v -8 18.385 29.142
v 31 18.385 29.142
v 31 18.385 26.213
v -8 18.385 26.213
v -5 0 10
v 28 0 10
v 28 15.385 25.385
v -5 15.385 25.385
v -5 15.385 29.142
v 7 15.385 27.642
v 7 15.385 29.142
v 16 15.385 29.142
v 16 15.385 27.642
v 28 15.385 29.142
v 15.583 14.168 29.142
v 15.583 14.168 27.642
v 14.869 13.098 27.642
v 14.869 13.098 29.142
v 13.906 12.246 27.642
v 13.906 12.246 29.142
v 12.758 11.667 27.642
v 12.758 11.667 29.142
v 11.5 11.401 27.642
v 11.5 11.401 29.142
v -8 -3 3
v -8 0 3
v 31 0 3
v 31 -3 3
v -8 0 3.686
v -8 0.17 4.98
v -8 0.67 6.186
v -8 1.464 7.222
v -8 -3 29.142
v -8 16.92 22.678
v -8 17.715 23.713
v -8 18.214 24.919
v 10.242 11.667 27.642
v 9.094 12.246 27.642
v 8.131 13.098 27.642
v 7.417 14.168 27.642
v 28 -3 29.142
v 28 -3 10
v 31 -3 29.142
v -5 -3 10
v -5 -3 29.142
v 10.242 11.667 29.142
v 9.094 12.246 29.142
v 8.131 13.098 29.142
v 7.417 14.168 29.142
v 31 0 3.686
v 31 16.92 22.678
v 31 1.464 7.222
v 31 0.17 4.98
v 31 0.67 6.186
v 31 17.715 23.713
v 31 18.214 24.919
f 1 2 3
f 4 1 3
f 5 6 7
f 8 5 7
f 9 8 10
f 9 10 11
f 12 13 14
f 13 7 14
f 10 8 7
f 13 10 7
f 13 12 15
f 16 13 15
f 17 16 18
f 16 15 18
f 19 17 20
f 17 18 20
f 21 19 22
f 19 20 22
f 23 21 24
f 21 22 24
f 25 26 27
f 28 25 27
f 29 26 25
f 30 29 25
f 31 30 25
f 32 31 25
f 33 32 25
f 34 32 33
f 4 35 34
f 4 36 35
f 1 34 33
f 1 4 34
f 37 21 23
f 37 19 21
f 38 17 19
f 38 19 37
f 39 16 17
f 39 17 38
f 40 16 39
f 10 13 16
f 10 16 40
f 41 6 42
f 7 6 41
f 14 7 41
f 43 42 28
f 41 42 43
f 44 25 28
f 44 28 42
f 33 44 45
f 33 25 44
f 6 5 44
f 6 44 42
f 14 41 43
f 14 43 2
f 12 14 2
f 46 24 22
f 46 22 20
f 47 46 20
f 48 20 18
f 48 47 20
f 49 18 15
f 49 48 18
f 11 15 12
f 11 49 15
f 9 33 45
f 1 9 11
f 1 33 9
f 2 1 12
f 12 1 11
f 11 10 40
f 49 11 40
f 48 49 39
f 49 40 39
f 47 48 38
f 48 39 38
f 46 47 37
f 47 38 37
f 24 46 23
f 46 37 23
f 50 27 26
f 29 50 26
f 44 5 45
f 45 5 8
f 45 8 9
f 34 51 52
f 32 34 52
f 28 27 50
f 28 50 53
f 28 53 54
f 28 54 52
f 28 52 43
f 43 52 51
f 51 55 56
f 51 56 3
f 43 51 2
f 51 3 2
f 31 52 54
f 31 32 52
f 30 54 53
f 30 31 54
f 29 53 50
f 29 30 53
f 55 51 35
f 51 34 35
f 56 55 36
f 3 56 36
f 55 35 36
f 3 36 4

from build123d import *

# Parameters (mm, degrees)
SKETCH_1_W          = 25
SKETCH_1_H          = 10
EXTRUDE_1_DEPTH     = 3
EXTRUDE_3_DEPTH     = 7
EXTRUDE_4_DEPTH     = 39
EXTRUDE_6_DEPTH     = 3
EXTRUDE_7_DEPTH     = 3
SKETCH_10_W         = 25
SKETCH_10_H         = 10
CUT_EXTRUDE_1_DEPTH = 3
FILLET_1_R          = 5
FILLET_2_R          = 5
SKETCH_12_W         = 9
SKETCH_12_H         = 1.5
EXTRUDE_9_DEPTH     = 4
FILLET_3_R          = 5


with BuildPart() as part:
    # 草图1 → 凸台-拉伸1 (new body)
    with BuildSketch(Plane.XY):
        with Locations((12.5, -5)):
            Rectangle(SKETCH_1_W, SKETCH_1_H)
    extrude(amount=EXTRUDE_1_DEPTH)

    # 草图5 → 凸台-拉伸3 (add)
    with BuildSketch(Plane.XY.offset(3)):
        Polygon((25, 0), (-2, 0), (-8, 0), (-8, -3), (0, -3), (27.572478777, -3), (31, -3), (31, 0), align=None)
    extrude(amount=EXTRUDE_3_DEPTH)

    # 草图6 → 凸台-拉伸4 (add)
    with BuildSketch(Plane(origin=(31, 0, 0), x_dir=(0, 0, -1), z_dir=(1, 0, 0))):
        Polygon((-10, 0), (-25.384776311, 15.384776311), (-29.142135624, 15.384776311), (-29.142135624, 18.384776311), (-24.142135624, 18.384776311), (-5.757359313, 0), align=None)
    extrude(amount=-EXTRUDE_4_DEPTH)

    # 草图8 → 凸台-拉伸6 (add)
    with BuildSketch(Plane(origin=(31, 0, 0), x_dir=(0, 0, -1), z_dir=(1, 0, 0))):
        Polygon((-29.142135624, 15.384776311), (-25.384776311, 15.384776311), (-10, 0), (-10, -3), (-29.142135624, -3), align=None)
    extrude(amount=-EXTRUDE_6_DEPTH)

    # 草图9 → 凸台-拉伸7 (add)
    with BuildSketch(Plane.ZY.offset(8)):
        Polygon((29.142135624, 15.384776311), (25.384776311, 15.384776311), (10, 0), (10, -3), (29.142135624, -3), align=None)
    extrude(amount=-EXTRUDE_7_DEPTH)

    # 草图10 → 切除-拉伸1 (cut)
    with BuildSketch(Plane(origin=(0, 0, 0), x_dir=(-1, 0, 0), z_dir=(0, 0, -1))):
        with Locations((-12.5, -5)):
            Rectangle(SKETCH_10_W, SKETCH_10_H)
    extrude(amount=-CUT_EXTRUDE_1_DEPTH, mode=Mode.SUBTRACT)

    # 圆角1
    fillet_1_edges = [part.edges().sort_by_distance(p)[0] for p in [
        (11.5, 18.384776311, 24.142135624),
    ]]
    fillet(fillet_1_edges, radius=FILLET_1_R)

    # 圆角2
    fillet_2_edges = [part.edges().sort_by_distance(p)[0] for p in [
        (11.5, 0, 5.757359313),
    ]]
    fillet(fillet_2_edges, radius=FILLET_2_R)

    # 草图12 → 凸台-拉伸9 (add)
    with BuildSketch(Plane(origin=(0, 15.384776311, 0), x_dir=(-1, 0, 0), z_dir=(0, -1, 0))):
        with Locations((-11.5, -28.392135624)):
            Rectangle(SKETCH_12_W, SKETCH_12_H)
    extrude(amount=EXTRUDE_9_DEPTH)

    # 圆角3
    # the kernel refuses this fillet: 5 mm, written as the material it takes off along each edge
    with BuildSketch(Plane(origin=(16, 11.384776311, 41.389584338), x_dir=(-1.590727549682408e-12, 1.0, 0), z_dir=(0, 0, -1))) as fillet_3_piece_1_section:
        with BuildLine():
            CenterArc((5, -4.898979486), FILLET_3_R, 101.536959033, 78.463040967)
            Line((0, -4.898979486), (0, 0))
            Line((0, 0), (4, 0))
        make_face()
    fillet_3_piece_1 = extrude(amount=25.994897428, mode=Mode.PRIVATE)
    fillet_3_piece_1 = split(fillet_3_piece_1, bisect_by=Plane(origin=(14.26962273, 15.448091311, 25.448091311), z_dir=(0, -0.7071067811865475, 0.7071067811865476)), keep=Keep.TOP, mode=Mode.PRIVATE)
    add(fillet_3_piece_1, mode=Mode.SUBTRACT)
    with BuildSketch(Plane(origin=(7, 11.384776311, 15.39468691), x_dir=(1.5905055050774829e-12, 1.0, 0), z_dir=(0, 0, 1))) as fillet_3_piece_2_section:
        with BuildLine():
            CenterArc((5, -4.898979486), FILLET_3_R, 101.536959033, 78.463040967)
            Line((0, -4.898979486), (0, 0))
            Line((0, 0), (4, 0))
        make_face()
    fillet_3_piece_2 = extrude(amount=25.994897428, mode=Mode.PRIVATE)
    fillet_3_piece_2 = split(fillet_3_piece_2, bisect_by=Plane(origin=(8.73037727, 15.448091311, 25.448091311), z_dir=(0, -0.7071067811865475, 0.7071067811865476)), keep=Keep.TOP, mode=Mode.PRIVATE)
    add(fillet_3_piece_2, mode=Mode.SUBTRACT)


solid = part.part
